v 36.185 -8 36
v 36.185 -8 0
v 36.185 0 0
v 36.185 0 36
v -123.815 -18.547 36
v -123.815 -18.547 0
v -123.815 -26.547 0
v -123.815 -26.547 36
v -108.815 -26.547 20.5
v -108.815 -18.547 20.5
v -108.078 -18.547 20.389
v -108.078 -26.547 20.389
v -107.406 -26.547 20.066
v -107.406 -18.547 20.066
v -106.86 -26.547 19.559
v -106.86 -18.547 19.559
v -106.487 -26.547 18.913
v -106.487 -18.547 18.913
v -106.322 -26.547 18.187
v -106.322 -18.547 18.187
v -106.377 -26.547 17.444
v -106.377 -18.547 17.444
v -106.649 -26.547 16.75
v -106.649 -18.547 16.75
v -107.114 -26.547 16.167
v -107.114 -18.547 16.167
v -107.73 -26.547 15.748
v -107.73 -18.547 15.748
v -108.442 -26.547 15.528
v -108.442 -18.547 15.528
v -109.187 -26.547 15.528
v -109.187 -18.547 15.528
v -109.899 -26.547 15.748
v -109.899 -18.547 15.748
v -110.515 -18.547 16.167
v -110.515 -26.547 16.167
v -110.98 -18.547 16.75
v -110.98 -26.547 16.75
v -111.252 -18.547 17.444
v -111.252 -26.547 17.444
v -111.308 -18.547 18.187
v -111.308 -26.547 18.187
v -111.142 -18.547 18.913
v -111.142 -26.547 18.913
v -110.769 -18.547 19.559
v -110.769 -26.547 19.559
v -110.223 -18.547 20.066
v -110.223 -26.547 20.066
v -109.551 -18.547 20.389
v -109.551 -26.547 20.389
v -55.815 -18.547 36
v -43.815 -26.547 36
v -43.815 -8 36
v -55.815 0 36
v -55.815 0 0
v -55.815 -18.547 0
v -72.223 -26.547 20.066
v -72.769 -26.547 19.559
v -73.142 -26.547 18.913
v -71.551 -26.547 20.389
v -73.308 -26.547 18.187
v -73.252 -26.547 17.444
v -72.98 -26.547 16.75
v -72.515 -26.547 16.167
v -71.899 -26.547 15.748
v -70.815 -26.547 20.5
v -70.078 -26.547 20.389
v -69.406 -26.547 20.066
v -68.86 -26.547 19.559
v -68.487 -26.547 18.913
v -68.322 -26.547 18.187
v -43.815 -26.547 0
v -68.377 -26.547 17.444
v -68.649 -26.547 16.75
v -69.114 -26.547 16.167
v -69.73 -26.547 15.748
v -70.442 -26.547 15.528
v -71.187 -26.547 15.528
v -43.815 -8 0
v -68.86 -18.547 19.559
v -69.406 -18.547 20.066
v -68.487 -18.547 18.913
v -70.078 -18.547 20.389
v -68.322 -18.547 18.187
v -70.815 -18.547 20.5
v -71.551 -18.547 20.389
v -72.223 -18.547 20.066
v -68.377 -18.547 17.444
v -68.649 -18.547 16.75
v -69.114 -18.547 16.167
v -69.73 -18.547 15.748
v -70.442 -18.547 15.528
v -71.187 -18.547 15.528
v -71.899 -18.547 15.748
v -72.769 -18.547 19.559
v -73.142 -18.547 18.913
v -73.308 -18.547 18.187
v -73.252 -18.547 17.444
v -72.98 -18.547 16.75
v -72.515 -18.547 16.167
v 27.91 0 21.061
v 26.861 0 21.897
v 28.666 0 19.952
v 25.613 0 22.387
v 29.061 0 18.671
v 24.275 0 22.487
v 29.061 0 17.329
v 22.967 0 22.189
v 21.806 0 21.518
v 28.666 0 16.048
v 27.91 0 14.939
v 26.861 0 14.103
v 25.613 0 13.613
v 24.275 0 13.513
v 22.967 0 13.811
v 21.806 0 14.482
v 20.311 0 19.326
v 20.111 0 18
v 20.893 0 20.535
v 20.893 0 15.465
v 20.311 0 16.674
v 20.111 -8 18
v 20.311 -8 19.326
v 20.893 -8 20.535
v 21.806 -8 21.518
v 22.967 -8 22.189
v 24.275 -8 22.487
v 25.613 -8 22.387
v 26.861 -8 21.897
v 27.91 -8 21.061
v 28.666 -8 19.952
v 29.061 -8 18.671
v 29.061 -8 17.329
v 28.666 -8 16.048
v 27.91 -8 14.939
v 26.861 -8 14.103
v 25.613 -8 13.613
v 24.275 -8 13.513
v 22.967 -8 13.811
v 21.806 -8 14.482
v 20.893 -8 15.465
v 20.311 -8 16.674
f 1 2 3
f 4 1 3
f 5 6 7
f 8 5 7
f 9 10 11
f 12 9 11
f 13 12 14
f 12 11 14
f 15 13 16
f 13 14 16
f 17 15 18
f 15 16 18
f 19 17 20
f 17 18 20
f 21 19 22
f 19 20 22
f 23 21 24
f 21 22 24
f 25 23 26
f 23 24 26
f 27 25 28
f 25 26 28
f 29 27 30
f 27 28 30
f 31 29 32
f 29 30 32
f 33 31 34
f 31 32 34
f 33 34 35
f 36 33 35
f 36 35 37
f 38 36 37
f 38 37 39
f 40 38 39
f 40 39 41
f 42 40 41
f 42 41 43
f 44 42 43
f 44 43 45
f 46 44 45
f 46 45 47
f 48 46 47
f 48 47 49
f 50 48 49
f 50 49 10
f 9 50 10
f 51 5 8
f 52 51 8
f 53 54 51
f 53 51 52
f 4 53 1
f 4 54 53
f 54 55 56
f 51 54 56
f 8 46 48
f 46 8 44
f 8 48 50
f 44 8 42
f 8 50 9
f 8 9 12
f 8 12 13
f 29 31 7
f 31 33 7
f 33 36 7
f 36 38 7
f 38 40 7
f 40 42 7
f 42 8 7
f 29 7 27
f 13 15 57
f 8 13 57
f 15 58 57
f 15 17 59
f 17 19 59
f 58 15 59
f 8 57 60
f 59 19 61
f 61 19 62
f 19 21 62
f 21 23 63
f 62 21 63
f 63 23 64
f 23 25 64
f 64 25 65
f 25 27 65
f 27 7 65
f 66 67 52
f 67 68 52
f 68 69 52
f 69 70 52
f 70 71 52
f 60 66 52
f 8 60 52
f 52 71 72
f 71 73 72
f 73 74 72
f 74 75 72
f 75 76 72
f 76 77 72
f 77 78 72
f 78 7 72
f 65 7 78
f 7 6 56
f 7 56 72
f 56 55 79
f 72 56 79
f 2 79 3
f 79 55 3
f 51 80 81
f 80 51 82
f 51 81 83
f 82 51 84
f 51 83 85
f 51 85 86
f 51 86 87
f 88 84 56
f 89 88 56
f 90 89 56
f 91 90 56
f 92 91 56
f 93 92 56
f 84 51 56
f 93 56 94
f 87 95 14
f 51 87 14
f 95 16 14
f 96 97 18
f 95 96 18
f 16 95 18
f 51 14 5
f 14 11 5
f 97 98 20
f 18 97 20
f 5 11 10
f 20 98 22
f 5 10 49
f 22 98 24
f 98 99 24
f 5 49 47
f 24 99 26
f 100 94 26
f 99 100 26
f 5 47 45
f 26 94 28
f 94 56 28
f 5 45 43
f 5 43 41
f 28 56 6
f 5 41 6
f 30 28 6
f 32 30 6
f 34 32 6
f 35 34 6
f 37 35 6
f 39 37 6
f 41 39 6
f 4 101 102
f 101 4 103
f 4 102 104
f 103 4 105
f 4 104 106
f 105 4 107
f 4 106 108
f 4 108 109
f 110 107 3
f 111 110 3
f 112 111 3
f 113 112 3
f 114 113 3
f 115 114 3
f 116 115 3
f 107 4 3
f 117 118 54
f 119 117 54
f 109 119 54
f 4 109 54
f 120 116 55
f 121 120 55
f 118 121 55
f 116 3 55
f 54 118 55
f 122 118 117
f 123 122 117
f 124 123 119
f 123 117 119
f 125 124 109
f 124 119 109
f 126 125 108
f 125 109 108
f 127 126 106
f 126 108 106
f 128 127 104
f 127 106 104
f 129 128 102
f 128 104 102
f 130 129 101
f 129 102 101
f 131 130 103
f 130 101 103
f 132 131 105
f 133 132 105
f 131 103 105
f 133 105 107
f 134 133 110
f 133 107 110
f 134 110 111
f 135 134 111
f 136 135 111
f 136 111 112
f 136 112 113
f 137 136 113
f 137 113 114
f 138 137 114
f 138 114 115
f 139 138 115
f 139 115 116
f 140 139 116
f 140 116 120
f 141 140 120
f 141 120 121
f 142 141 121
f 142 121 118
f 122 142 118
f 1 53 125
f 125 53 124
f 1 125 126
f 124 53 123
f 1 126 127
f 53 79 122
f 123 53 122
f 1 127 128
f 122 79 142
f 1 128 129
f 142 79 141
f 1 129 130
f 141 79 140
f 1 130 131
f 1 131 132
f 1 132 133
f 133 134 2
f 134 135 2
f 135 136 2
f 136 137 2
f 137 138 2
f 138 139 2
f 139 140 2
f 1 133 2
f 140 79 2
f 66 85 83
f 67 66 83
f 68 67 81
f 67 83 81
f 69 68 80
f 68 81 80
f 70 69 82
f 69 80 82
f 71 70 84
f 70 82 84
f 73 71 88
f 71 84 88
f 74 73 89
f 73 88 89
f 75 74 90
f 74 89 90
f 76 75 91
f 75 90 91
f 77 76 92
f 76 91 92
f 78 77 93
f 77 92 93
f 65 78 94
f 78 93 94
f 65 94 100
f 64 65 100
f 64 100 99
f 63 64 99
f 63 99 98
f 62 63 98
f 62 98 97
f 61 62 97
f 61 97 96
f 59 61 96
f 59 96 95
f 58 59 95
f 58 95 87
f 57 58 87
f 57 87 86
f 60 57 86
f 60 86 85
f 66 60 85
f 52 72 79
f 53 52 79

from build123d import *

# Parameters (mm, degrees)
BOSS_EXTRUDE1_DEPTH = 36
SKETCH2_R           = 4.5
CUT_EXTRUDE1_DEPTH  = 30
SKETCH3_R           = 2.5
CUT_EXTRUDE2_DEPTH  = 10


with BuildPart() as part:
    # Sketch1 → Boss-Extrude1 (new body)
    with BuildSketch(Plane.XY):
        Polygon((-123.814545152, -26.546784039), (-43.814545152, -26.546784039), (-43.814545152, -15.688919663), (-43.814545152, -8), (-29.603926395, -8), (0.496524767, -8), (36.185454848, -8), (36.185454848, 0), (-33.18939726, 0), (-55.814545152, 0), (-55.814545152, -18.546784039), (-123.814545152, -18.546784039), align=None)
    extrude(amount=BOSS_EXTRUDE1_DEPTH)

    # Sketch2 → Cut-Extrude1 (cut)
    with BuildSketch(Plane(origin=(0, 0, 0), x_dir=(1, 0, 0), z_dir=(0, 1, 0))):
        with Locations(Location((24.611399957, -18, 0), (0, 0, 180))):
            Circle(SKETCH2_R)
    extrude(amount=-CUT_EXTRUDE1_DEPTH, mode=Mode.SUBTRACT)

    # Sketch3 → Cut-Extrude2 (cut)
    with BuildSketch(Plane(origin=(0, -18.546784039, 0), x_dir=(1, 0, 0), z_dir=(0, 1, 0))):
        with Locations(Location((-108.814545152, -18, 0), (0, 0, 270))):
            Circle(SKETCH3_R)
        with Locations(Location((-70.814545152, -18, 0), (0, 0, 270))):
            Circle(SKETCH3_R)
    extrude(amount=-CUT_EXTRUDE2_DEPTH, mode=Mode.SUBTRACT)


solid = part.part
